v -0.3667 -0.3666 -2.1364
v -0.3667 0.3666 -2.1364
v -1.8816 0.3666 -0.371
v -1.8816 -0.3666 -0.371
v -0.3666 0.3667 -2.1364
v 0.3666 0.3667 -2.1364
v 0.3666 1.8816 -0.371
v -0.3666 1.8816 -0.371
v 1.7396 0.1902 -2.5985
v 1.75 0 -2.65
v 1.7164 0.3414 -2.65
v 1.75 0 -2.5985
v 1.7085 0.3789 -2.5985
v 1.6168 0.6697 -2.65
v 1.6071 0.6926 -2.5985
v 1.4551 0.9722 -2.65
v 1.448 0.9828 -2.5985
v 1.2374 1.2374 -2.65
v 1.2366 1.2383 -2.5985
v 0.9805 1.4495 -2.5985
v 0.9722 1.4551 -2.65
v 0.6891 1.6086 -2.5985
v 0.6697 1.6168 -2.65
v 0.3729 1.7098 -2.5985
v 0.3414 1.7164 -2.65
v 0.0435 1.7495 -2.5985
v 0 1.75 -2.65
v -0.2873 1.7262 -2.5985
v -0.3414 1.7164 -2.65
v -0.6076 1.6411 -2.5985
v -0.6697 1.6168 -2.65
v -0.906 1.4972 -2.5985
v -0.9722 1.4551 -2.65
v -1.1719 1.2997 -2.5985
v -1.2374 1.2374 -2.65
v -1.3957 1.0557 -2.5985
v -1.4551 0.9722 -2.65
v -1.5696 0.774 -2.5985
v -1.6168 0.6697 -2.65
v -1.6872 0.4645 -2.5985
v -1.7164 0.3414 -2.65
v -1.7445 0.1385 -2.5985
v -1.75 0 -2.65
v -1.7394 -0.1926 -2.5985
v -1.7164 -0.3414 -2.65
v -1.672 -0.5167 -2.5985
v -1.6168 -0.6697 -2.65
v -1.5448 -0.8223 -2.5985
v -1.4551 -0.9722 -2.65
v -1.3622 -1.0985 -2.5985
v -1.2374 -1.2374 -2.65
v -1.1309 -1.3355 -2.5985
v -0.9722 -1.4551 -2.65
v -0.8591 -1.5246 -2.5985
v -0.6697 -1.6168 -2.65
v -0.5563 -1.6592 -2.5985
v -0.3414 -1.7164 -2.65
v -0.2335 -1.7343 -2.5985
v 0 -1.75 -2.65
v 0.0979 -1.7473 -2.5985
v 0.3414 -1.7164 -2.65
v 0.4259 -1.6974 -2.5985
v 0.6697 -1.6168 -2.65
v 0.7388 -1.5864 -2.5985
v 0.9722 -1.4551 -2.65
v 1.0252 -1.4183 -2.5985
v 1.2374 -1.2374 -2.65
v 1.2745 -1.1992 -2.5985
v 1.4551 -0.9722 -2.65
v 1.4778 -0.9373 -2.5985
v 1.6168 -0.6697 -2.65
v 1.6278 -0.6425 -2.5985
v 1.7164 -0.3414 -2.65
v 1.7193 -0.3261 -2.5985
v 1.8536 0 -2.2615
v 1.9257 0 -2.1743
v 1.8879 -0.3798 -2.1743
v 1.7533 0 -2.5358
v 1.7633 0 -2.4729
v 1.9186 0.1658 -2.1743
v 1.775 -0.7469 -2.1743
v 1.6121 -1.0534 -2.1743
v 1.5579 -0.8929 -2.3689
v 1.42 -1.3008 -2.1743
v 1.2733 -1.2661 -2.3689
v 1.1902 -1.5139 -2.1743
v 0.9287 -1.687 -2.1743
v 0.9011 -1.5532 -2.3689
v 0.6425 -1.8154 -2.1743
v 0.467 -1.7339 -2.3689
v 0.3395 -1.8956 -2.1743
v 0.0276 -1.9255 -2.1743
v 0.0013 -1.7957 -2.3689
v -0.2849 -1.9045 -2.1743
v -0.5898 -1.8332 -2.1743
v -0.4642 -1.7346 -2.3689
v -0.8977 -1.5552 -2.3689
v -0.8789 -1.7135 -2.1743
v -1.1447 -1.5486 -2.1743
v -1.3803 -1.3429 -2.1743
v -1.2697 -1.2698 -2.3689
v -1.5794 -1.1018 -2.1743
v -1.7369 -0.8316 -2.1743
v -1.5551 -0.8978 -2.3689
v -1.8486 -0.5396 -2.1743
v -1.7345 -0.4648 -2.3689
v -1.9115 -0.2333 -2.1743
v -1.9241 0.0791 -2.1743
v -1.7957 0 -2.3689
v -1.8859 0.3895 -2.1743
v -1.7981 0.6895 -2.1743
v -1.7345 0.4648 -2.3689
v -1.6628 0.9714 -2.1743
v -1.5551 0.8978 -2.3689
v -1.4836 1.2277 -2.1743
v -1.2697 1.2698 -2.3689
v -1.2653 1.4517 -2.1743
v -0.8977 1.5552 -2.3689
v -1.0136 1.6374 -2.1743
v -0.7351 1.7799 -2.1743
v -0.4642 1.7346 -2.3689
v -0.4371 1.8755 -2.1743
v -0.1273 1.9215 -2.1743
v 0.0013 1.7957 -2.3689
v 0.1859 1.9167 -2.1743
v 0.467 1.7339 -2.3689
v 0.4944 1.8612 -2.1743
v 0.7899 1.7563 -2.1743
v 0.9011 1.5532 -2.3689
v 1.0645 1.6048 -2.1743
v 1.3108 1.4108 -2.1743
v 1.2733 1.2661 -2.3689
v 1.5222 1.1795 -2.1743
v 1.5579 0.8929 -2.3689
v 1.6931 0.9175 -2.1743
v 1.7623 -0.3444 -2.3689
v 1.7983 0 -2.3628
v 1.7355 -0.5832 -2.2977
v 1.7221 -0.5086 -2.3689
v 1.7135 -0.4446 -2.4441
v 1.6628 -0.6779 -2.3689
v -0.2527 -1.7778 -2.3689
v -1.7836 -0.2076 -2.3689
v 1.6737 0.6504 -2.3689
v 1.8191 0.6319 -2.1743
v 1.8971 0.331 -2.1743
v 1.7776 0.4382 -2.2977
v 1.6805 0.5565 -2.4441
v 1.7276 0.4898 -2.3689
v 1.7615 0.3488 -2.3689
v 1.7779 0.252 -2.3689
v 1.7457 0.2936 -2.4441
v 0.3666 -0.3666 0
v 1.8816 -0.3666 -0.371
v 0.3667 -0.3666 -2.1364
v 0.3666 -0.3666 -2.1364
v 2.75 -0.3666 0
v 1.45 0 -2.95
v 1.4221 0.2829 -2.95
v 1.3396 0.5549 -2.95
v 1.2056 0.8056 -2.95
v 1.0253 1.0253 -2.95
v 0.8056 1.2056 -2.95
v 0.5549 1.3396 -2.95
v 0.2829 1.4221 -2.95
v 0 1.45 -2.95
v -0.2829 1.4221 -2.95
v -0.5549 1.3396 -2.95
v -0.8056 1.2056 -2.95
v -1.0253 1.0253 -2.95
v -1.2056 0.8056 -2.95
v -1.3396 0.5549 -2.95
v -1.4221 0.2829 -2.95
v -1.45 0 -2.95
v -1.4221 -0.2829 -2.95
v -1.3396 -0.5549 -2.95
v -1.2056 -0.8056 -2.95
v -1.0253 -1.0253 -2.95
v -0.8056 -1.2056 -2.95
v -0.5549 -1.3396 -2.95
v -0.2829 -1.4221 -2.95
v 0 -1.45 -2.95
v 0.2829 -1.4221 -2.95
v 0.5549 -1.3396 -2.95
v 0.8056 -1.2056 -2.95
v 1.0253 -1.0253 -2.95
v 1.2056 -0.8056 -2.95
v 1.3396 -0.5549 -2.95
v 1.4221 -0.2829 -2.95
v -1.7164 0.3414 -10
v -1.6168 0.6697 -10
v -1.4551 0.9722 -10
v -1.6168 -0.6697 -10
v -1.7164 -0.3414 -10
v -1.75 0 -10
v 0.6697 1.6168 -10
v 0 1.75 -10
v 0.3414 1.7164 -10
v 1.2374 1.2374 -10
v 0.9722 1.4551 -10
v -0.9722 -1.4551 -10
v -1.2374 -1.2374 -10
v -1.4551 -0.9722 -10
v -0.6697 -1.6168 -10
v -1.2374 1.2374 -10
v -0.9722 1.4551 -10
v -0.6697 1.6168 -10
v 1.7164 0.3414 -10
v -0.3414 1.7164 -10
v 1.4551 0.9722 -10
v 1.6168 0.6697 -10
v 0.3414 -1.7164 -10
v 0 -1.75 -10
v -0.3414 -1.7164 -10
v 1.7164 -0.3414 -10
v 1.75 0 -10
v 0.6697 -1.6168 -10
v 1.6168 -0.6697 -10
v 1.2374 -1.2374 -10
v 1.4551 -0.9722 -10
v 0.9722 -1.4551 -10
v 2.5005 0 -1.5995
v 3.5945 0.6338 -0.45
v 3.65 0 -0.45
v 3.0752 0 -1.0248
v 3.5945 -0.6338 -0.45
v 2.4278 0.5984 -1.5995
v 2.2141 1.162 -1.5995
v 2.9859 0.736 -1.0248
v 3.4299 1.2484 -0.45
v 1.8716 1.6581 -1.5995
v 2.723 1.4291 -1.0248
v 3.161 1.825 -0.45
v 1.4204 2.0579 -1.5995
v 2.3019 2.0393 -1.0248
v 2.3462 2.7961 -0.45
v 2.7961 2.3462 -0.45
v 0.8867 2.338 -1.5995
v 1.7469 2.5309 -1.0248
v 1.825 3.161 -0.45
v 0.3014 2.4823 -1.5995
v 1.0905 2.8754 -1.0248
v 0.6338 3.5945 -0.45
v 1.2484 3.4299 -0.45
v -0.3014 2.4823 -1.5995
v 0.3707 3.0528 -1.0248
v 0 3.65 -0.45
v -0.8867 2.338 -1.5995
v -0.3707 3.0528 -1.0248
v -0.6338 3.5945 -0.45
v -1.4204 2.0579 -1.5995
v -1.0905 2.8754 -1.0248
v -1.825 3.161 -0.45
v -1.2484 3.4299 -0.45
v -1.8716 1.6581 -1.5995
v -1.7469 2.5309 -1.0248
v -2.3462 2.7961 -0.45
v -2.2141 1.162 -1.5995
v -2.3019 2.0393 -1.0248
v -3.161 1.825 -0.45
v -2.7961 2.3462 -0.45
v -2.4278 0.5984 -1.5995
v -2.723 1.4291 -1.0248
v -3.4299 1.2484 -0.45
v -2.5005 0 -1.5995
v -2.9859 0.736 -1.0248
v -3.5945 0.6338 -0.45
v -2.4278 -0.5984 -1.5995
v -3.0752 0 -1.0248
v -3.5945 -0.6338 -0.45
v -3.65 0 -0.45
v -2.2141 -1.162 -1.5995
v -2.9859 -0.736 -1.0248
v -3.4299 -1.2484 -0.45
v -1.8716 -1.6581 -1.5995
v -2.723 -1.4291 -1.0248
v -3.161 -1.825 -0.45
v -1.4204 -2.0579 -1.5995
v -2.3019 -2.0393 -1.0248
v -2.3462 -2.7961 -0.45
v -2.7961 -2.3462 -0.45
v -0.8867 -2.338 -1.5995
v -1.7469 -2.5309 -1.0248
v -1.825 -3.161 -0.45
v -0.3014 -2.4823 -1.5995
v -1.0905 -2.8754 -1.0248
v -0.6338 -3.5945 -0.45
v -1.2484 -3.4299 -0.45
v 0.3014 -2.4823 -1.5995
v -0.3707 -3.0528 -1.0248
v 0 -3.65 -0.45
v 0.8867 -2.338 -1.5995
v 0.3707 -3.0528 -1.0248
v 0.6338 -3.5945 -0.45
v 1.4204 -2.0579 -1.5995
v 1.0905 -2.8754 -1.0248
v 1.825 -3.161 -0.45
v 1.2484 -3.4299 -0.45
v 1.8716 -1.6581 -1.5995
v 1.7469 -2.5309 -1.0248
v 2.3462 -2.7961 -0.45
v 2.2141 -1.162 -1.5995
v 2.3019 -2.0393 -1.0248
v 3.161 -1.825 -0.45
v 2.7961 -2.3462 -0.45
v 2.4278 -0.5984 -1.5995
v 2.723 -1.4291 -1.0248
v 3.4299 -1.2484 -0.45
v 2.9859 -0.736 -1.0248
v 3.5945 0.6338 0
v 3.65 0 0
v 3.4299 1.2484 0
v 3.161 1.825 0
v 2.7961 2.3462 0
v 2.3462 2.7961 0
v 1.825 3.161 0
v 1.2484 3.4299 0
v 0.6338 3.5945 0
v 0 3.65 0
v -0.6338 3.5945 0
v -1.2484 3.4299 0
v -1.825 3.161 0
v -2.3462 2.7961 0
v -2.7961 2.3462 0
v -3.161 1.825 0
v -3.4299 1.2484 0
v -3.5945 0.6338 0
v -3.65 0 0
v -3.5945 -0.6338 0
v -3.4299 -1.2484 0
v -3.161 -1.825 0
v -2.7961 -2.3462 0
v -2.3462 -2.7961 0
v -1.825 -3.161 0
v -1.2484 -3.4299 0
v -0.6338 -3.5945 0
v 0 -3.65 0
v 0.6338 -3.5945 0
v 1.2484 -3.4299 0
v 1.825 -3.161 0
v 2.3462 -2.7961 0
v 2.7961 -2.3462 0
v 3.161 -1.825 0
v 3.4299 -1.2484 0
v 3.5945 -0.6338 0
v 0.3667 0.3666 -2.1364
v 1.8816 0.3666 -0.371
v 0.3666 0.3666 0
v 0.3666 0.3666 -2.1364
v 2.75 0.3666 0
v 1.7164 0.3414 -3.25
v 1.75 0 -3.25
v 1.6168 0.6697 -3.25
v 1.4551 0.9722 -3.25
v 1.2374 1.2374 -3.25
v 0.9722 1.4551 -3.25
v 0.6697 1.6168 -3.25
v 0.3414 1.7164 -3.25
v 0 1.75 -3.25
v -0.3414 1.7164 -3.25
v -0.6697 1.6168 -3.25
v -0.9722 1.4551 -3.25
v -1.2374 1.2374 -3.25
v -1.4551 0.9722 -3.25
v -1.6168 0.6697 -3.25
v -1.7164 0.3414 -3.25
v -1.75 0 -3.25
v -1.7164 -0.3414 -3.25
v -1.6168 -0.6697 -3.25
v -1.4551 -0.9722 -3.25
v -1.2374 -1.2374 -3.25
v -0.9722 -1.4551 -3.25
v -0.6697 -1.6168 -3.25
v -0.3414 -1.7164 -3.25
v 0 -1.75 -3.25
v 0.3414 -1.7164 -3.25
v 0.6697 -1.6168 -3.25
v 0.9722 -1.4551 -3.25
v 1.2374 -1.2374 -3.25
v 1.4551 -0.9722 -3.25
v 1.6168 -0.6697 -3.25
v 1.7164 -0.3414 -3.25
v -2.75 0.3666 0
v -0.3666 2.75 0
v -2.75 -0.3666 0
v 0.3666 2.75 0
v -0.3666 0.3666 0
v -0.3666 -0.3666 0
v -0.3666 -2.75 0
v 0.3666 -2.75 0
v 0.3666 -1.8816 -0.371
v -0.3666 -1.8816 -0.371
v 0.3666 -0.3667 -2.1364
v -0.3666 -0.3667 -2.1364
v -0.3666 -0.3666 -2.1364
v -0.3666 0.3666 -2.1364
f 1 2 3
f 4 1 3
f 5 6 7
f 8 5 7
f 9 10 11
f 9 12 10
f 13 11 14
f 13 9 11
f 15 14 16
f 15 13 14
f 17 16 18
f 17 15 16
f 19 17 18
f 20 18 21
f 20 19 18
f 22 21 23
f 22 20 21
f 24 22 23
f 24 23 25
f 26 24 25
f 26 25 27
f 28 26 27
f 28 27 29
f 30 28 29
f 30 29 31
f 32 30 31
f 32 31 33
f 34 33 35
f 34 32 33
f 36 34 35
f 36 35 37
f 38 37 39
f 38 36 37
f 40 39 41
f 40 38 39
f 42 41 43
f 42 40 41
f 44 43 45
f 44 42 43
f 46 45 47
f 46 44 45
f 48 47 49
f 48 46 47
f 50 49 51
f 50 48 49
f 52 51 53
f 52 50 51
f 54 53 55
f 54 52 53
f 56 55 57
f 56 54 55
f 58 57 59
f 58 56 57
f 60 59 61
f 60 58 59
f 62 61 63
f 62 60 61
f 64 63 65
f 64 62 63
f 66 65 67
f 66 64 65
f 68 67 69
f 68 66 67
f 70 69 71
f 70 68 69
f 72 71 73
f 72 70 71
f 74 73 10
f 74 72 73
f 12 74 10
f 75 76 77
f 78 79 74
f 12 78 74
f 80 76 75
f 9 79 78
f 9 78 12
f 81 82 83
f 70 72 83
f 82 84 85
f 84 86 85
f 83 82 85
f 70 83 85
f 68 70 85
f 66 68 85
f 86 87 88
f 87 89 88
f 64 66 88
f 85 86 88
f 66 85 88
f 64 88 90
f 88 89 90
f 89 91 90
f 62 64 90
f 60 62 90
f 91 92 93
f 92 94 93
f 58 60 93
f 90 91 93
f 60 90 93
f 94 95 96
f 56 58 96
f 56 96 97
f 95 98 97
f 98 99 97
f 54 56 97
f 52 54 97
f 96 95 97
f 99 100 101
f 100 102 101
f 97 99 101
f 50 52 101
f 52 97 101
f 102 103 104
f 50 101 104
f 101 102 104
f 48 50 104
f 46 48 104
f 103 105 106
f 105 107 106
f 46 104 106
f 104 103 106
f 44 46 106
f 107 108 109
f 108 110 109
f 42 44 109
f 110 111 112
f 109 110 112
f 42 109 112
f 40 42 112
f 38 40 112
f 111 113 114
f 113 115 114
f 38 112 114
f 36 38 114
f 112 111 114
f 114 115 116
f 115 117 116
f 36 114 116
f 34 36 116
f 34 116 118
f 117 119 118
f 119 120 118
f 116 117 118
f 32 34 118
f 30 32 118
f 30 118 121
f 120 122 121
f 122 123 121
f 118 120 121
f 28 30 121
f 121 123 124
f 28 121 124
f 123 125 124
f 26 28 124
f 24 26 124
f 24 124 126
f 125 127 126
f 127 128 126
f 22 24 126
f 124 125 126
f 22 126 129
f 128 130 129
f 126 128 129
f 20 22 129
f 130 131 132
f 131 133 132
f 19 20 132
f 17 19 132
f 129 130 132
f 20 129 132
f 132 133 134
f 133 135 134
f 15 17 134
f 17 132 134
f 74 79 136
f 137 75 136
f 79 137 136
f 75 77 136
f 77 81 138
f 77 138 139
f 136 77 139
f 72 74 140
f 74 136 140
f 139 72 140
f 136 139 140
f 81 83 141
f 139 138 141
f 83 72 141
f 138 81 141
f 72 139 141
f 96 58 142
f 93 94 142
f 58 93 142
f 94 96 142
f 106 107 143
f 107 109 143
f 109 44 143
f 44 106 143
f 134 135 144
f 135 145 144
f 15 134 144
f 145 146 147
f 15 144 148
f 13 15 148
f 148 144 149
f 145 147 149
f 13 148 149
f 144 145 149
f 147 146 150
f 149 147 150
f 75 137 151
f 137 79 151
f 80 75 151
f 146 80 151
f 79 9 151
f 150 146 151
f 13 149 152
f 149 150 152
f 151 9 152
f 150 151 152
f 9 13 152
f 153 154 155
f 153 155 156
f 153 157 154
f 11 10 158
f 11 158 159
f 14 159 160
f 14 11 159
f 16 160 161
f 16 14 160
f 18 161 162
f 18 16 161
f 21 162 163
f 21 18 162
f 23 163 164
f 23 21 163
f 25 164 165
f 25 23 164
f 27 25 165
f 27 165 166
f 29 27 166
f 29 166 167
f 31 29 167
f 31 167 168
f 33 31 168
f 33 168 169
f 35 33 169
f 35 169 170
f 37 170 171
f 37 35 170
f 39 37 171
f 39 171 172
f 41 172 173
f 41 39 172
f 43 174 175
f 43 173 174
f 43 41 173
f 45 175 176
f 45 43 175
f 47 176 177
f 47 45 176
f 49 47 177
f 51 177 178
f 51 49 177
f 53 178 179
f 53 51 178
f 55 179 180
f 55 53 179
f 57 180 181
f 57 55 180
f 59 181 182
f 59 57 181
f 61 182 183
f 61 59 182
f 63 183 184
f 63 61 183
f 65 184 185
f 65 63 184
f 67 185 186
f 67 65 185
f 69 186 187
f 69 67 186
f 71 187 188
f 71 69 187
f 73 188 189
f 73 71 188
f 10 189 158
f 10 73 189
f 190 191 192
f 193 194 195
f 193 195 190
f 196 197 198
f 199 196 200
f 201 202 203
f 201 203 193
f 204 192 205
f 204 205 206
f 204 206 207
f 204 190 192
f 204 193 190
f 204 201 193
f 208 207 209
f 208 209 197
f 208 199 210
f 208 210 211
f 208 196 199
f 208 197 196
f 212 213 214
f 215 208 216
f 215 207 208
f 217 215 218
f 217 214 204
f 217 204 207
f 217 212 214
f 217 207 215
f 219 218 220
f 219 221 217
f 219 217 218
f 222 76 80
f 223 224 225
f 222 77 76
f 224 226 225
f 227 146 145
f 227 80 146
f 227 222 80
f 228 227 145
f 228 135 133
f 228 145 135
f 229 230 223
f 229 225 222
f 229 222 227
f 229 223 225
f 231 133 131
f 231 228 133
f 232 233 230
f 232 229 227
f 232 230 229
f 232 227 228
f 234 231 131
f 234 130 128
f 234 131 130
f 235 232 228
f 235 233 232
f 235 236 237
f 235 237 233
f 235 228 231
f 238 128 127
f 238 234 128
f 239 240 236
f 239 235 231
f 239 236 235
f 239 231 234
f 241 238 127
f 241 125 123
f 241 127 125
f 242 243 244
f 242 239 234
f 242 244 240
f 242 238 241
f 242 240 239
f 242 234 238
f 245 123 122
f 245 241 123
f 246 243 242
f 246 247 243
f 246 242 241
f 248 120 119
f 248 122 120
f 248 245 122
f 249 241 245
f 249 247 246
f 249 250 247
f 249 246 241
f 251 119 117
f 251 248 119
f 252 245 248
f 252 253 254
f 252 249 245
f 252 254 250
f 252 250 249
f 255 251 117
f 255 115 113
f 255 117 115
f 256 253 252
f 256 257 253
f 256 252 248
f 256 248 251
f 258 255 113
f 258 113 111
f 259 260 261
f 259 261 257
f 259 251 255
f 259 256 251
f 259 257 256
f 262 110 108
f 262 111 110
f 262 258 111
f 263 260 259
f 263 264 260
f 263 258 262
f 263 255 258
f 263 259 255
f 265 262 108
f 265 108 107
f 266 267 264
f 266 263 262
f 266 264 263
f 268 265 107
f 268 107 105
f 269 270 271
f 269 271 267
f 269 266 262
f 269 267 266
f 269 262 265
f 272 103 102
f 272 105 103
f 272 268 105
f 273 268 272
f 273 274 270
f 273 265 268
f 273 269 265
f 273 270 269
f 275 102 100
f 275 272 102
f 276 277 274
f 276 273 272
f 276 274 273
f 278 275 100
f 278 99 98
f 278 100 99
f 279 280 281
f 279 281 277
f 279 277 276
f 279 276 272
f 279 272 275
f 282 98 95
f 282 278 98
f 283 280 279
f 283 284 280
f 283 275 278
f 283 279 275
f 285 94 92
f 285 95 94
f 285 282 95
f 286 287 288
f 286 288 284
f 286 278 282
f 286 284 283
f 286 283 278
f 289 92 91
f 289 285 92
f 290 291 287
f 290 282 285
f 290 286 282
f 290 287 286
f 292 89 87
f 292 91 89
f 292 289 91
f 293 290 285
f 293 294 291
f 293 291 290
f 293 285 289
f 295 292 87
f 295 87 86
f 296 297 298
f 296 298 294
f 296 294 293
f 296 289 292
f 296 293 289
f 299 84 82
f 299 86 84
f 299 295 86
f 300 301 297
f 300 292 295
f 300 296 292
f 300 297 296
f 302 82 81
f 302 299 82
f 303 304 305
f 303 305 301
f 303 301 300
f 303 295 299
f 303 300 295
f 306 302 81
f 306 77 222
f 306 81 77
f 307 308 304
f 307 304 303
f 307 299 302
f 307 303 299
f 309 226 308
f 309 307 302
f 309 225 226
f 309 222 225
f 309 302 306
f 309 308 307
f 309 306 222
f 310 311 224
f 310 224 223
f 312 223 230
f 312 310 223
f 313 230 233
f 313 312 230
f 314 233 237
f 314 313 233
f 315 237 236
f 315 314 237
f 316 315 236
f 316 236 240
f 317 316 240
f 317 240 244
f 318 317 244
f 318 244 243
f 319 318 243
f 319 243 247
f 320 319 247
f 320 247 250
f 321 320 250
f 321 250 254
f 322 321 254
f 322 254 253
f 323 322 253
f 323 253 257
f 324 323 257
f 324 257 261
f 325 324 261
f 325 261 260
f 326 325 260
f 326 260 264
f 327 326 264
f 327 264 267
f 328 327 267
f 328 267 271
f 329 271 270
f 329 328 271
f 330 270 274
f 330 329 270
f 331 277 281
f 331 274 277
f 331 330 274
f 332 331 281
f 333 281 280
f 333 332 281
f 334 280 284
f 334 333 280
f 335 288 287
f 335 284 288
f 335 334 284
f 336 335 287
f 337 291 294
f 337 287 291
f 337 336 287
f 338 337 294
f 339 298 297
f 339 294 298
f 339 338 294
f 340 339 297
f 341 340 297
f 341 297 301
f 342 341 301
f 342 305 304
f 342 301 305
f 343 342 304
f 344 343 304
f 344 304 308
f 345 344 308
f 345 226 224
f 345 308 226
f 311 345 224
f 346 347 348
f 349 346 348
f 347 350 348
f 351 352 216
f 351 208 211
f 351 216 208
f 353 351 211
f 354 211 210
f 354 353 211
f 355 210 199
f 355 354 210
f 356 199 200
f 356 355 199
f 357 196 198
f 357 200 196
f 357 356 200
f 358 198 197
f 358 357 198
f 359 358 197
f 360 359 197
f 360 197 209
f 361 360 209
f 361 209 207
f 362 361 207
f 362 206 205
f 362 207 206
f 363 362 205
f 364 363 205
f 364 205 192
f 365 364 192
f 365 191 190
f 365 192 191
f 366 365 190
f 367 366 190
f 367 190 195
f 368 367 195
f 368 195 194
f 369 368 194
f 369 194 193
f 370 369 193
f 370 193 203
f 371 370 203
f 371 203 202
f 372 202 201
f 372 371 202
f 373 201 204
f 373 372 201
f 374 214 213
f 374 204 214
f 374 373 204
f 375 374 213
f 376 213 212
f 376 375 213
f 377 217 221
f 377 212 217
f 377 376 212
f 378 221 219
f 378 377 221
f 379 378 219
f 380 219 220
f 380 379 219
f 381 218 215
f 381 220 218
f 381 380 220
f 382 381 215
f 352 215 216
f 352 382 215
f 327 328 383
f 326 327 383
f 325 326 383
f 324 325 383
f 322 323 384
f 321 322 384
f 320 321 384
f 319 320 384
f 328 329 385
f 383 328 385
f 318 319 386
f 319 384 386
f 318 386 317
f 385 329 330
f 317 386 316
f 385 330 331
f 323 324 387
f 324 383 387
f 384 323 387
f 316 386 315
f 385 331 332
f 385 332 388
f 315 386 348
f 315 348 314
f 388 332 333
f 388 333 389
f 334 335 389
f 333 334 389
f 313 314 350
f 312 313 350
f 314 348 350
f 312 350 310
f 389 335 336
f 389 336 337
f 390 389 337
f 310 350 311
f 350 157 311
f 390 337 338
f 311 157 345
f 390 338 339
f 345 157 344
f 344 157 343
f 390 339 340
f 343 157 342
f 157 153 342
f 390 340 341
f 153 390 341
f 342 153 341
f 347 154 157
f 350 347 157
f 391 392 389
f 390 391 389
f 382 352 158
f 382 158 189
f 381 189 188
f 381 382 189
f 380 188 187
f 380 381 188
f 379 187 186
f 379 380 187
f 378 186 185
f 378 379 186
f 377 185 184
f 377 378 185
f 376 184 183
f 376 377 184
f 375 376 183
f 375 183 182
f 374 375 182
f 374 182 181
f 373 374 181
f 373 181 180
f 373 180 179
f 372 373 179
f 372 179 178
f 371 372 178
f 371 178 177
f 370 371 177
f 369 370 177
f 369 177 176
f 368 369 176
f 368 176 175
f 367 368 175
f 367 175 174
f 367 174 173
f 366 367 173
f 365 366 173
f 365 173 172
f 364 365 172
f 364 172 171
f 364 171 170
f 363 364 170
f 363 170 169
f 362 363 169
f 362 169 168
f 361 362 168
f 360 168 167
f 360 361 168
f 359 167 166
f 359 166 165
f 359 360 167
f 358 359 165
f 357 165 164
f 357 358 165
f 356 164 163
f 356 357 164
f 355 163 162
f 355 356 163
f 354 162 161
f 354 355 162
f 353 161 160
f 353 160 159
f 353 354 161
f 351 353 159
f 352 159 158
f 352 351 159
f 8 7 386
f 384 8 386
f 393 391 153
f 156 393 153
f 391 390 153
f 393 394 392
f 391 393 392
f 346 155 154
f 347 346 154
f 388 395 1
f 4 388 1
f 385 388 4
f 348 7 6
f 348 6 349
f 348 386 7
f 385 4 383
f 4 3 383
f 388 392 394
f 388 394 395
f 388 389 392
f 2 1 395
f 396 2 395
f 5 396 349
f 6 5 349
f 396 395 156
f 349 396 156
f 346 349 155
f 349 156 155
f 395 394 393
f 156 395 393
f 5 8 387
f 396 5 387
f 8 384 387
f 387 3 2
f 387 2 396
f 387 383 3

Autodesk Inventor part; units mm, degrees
ref_plane "YZ Plane" through (0, 0, 0) normal (1, 0, 0) x (0, 1, 0)
sketch "Esquisse1" plane through (0, 0, 0) normal (0, 1, 0) x (-1, 0, 0)
  point P0 (0, 0)
sketch "Esquisse2" plane through (0, 0, 0) normal (0, 0, 1) x (1, 0, 0)
  point P0 (0, 0)
sketch "Esquisse3" plane through (0, 0, 0) normal (0, 0, 1) x (1, 0, 0)
  point P0 (0, 0)
sketch "Esquisse4" plane through (0, 0, 0) normal (0, 1, 0) x (-1, 0, 0)
  line L0 (-3.65, 0) -> (0, 0)
  line L1 (-3.65, -0.45) -> (-3.65, 0)
  line L2 (-1.75, -2.35) -> (-3.65, -0.45)
  line L3 (-1.75, -2.65) -> (-1.75, -2.35)
  line L4 (-1.45, -2.95) -> (-1.75, -2.65)
  line L5 (-1.75, -3.25) -> (-1.45, -2.95)
  line L6 (-1.75, -10) -> (-1.75, -3.25)
  line L7 (0, 0) -> (0, -10)
  line L8 (0, 3.3392) -> (0, -10.7) construction
  line L9 (0, 3.3392) -> (0, -10.7)
  line L10 (0, -13.5078) -> (0, 6.1471) projected
  line L11 (-1.75, -10) -> (0, -10)
  line L12 (0.73, 0) -> (-4.38, 0) projected
  dimension "d3" = 3.65
  dimension "d5" = 0.3
  dimension "d7" = 0.3
  dimension "d9" = 0.3
  dimension "d11" = 2.35
  dimension "d13" = 135
  dimension "d17" = 1.45
  dimension "d19" = 0
  dimension "d51" = 1.75
  dimension "d52" = 10
revolve "Révolution1" add sketch "Esquisse4" angle 360 about axis through (0, 0, 3.3392) along (0, 0, -1)
sketch "Esquisse5" plane through (0, 0, 0) normal (0, 1, 0) x (-1, 0, 0)
  line L0 (-2.2, 0) -> (0, 0)
  line L1 (-0.3667, -2.1364) -> (-2.2, 0)
  line L2 (0, -2.1364) -> (-0.3667, -2.1364)
  line L3 (0, 0) -> (0, -2.1364)
  line L4 (-1.75, -2.35) -> (1.75, -2.35) construction
  line L5 (-3.65, 0) -> (3.65, 0) projected
  line L6 (0, -2.82) -> (0, 0.47) projected
  dimension "d22" = 2.2
  dimension "d24" = 0.3667
  dimension "d26" = 2.1364
extrude "Extrusion1" cut sketch "Esquisse5" along normal mid plane 0.7333
pattern_circular "RéseauPolaire1" count 4 over 360 about axis through (0, 0, 0) along (0, 0, 1) of "Extrusion1"
sketch "Esquisse7" plane through (0, 0, 0) normal (0, 1, 0) x (-1, 0, 0)
  line L0 (0, -1.175) -> (-2.75, 0)
  line L1 (0, 0) -> (0, -1.175)
  line L2 (-2.75, 0) -> (0, 0)
  line L3 (-1.75, -2.35) -> (1.75, -2.35) construction
  line L4 (0, -2.82) -> (0, 0.47) projected
  line L5 (-3.65, 0) -> (3.65, 0) projected
  dimension "d33" = 2.75
  dimension "d35" = 1.175
extrude "Extrusion2" cut sketch "Esquisse7" along normal mid plane 0.7333
pattern_circular "RéseauPolaire2" count 4 over 360 about axis through (0, 0, 0) along (0, 0, 1) of "Extrusion2"
fillet "Congé1" radius 0.6 1 edges at (-1.75, 0, -2.35)
thread "Filetage1" size "M3.5x0.6" class "6g" standard "ISO Metric profile" full length
ref_plane "MSC_PF1" through (0, 0, 0) normal (1, 0, 0) x (0, 1, 0)
ref_plane "MSC_PT1" through (0, 0, 0) normal (0, 0, -1) x (-1, 0, 0)
equation "\"d3\" = 0.5 * Dh"
equation "\"d5\" = msp_x"
equation "\"d7\" = ParA"
equation "\"d9\" = msp_x"
equation "\"d11\" = ParK"
equation "\"d17\" = 0.5 * msp_mdtds"
equation "\"d51\" = 0.5 * NND"
equation "\"d52\" = NLG"
equation "\"d22\" = 0.5 * M"
equation "\"d24\" = 0.0833333 * M"
equation "\"d26\" = 0.909091 * ParK"
equation "\"d27\" = 0.166667 * M"
equation "\"d33\" = 0.625 * M"
equation "\"d35\" = 0.5 * ParK"
equation "\"d36\" = 0.166667 * M"
equation "\"d41\" = 2 * msp_x"
equation "\"PTC\" = 0.6"
equation "\"NLG\" = 10"
equation "\"ParK\" = 2.35"
equation "\"NND\" = 3.5"
equation "\"M\" = 4.4"
equation "\"msp_mdtds\" = NND - PTC"
equation "\"Dh\" = 7.3"
equation "\"msp_x\" = 0.5 * PTC"
equation "\"ParA\" = 0.5 * PTC"
equation "\"r\" = 0.9"
equation "\"THREADDIA\" = NND"
equation "\"TEMPLATE\" = 1.2345"
properties part number "NF EN ISO 7046-2 H - M3.5x10 - 8.8 - H1" material "Acier inoxydable 440C"
